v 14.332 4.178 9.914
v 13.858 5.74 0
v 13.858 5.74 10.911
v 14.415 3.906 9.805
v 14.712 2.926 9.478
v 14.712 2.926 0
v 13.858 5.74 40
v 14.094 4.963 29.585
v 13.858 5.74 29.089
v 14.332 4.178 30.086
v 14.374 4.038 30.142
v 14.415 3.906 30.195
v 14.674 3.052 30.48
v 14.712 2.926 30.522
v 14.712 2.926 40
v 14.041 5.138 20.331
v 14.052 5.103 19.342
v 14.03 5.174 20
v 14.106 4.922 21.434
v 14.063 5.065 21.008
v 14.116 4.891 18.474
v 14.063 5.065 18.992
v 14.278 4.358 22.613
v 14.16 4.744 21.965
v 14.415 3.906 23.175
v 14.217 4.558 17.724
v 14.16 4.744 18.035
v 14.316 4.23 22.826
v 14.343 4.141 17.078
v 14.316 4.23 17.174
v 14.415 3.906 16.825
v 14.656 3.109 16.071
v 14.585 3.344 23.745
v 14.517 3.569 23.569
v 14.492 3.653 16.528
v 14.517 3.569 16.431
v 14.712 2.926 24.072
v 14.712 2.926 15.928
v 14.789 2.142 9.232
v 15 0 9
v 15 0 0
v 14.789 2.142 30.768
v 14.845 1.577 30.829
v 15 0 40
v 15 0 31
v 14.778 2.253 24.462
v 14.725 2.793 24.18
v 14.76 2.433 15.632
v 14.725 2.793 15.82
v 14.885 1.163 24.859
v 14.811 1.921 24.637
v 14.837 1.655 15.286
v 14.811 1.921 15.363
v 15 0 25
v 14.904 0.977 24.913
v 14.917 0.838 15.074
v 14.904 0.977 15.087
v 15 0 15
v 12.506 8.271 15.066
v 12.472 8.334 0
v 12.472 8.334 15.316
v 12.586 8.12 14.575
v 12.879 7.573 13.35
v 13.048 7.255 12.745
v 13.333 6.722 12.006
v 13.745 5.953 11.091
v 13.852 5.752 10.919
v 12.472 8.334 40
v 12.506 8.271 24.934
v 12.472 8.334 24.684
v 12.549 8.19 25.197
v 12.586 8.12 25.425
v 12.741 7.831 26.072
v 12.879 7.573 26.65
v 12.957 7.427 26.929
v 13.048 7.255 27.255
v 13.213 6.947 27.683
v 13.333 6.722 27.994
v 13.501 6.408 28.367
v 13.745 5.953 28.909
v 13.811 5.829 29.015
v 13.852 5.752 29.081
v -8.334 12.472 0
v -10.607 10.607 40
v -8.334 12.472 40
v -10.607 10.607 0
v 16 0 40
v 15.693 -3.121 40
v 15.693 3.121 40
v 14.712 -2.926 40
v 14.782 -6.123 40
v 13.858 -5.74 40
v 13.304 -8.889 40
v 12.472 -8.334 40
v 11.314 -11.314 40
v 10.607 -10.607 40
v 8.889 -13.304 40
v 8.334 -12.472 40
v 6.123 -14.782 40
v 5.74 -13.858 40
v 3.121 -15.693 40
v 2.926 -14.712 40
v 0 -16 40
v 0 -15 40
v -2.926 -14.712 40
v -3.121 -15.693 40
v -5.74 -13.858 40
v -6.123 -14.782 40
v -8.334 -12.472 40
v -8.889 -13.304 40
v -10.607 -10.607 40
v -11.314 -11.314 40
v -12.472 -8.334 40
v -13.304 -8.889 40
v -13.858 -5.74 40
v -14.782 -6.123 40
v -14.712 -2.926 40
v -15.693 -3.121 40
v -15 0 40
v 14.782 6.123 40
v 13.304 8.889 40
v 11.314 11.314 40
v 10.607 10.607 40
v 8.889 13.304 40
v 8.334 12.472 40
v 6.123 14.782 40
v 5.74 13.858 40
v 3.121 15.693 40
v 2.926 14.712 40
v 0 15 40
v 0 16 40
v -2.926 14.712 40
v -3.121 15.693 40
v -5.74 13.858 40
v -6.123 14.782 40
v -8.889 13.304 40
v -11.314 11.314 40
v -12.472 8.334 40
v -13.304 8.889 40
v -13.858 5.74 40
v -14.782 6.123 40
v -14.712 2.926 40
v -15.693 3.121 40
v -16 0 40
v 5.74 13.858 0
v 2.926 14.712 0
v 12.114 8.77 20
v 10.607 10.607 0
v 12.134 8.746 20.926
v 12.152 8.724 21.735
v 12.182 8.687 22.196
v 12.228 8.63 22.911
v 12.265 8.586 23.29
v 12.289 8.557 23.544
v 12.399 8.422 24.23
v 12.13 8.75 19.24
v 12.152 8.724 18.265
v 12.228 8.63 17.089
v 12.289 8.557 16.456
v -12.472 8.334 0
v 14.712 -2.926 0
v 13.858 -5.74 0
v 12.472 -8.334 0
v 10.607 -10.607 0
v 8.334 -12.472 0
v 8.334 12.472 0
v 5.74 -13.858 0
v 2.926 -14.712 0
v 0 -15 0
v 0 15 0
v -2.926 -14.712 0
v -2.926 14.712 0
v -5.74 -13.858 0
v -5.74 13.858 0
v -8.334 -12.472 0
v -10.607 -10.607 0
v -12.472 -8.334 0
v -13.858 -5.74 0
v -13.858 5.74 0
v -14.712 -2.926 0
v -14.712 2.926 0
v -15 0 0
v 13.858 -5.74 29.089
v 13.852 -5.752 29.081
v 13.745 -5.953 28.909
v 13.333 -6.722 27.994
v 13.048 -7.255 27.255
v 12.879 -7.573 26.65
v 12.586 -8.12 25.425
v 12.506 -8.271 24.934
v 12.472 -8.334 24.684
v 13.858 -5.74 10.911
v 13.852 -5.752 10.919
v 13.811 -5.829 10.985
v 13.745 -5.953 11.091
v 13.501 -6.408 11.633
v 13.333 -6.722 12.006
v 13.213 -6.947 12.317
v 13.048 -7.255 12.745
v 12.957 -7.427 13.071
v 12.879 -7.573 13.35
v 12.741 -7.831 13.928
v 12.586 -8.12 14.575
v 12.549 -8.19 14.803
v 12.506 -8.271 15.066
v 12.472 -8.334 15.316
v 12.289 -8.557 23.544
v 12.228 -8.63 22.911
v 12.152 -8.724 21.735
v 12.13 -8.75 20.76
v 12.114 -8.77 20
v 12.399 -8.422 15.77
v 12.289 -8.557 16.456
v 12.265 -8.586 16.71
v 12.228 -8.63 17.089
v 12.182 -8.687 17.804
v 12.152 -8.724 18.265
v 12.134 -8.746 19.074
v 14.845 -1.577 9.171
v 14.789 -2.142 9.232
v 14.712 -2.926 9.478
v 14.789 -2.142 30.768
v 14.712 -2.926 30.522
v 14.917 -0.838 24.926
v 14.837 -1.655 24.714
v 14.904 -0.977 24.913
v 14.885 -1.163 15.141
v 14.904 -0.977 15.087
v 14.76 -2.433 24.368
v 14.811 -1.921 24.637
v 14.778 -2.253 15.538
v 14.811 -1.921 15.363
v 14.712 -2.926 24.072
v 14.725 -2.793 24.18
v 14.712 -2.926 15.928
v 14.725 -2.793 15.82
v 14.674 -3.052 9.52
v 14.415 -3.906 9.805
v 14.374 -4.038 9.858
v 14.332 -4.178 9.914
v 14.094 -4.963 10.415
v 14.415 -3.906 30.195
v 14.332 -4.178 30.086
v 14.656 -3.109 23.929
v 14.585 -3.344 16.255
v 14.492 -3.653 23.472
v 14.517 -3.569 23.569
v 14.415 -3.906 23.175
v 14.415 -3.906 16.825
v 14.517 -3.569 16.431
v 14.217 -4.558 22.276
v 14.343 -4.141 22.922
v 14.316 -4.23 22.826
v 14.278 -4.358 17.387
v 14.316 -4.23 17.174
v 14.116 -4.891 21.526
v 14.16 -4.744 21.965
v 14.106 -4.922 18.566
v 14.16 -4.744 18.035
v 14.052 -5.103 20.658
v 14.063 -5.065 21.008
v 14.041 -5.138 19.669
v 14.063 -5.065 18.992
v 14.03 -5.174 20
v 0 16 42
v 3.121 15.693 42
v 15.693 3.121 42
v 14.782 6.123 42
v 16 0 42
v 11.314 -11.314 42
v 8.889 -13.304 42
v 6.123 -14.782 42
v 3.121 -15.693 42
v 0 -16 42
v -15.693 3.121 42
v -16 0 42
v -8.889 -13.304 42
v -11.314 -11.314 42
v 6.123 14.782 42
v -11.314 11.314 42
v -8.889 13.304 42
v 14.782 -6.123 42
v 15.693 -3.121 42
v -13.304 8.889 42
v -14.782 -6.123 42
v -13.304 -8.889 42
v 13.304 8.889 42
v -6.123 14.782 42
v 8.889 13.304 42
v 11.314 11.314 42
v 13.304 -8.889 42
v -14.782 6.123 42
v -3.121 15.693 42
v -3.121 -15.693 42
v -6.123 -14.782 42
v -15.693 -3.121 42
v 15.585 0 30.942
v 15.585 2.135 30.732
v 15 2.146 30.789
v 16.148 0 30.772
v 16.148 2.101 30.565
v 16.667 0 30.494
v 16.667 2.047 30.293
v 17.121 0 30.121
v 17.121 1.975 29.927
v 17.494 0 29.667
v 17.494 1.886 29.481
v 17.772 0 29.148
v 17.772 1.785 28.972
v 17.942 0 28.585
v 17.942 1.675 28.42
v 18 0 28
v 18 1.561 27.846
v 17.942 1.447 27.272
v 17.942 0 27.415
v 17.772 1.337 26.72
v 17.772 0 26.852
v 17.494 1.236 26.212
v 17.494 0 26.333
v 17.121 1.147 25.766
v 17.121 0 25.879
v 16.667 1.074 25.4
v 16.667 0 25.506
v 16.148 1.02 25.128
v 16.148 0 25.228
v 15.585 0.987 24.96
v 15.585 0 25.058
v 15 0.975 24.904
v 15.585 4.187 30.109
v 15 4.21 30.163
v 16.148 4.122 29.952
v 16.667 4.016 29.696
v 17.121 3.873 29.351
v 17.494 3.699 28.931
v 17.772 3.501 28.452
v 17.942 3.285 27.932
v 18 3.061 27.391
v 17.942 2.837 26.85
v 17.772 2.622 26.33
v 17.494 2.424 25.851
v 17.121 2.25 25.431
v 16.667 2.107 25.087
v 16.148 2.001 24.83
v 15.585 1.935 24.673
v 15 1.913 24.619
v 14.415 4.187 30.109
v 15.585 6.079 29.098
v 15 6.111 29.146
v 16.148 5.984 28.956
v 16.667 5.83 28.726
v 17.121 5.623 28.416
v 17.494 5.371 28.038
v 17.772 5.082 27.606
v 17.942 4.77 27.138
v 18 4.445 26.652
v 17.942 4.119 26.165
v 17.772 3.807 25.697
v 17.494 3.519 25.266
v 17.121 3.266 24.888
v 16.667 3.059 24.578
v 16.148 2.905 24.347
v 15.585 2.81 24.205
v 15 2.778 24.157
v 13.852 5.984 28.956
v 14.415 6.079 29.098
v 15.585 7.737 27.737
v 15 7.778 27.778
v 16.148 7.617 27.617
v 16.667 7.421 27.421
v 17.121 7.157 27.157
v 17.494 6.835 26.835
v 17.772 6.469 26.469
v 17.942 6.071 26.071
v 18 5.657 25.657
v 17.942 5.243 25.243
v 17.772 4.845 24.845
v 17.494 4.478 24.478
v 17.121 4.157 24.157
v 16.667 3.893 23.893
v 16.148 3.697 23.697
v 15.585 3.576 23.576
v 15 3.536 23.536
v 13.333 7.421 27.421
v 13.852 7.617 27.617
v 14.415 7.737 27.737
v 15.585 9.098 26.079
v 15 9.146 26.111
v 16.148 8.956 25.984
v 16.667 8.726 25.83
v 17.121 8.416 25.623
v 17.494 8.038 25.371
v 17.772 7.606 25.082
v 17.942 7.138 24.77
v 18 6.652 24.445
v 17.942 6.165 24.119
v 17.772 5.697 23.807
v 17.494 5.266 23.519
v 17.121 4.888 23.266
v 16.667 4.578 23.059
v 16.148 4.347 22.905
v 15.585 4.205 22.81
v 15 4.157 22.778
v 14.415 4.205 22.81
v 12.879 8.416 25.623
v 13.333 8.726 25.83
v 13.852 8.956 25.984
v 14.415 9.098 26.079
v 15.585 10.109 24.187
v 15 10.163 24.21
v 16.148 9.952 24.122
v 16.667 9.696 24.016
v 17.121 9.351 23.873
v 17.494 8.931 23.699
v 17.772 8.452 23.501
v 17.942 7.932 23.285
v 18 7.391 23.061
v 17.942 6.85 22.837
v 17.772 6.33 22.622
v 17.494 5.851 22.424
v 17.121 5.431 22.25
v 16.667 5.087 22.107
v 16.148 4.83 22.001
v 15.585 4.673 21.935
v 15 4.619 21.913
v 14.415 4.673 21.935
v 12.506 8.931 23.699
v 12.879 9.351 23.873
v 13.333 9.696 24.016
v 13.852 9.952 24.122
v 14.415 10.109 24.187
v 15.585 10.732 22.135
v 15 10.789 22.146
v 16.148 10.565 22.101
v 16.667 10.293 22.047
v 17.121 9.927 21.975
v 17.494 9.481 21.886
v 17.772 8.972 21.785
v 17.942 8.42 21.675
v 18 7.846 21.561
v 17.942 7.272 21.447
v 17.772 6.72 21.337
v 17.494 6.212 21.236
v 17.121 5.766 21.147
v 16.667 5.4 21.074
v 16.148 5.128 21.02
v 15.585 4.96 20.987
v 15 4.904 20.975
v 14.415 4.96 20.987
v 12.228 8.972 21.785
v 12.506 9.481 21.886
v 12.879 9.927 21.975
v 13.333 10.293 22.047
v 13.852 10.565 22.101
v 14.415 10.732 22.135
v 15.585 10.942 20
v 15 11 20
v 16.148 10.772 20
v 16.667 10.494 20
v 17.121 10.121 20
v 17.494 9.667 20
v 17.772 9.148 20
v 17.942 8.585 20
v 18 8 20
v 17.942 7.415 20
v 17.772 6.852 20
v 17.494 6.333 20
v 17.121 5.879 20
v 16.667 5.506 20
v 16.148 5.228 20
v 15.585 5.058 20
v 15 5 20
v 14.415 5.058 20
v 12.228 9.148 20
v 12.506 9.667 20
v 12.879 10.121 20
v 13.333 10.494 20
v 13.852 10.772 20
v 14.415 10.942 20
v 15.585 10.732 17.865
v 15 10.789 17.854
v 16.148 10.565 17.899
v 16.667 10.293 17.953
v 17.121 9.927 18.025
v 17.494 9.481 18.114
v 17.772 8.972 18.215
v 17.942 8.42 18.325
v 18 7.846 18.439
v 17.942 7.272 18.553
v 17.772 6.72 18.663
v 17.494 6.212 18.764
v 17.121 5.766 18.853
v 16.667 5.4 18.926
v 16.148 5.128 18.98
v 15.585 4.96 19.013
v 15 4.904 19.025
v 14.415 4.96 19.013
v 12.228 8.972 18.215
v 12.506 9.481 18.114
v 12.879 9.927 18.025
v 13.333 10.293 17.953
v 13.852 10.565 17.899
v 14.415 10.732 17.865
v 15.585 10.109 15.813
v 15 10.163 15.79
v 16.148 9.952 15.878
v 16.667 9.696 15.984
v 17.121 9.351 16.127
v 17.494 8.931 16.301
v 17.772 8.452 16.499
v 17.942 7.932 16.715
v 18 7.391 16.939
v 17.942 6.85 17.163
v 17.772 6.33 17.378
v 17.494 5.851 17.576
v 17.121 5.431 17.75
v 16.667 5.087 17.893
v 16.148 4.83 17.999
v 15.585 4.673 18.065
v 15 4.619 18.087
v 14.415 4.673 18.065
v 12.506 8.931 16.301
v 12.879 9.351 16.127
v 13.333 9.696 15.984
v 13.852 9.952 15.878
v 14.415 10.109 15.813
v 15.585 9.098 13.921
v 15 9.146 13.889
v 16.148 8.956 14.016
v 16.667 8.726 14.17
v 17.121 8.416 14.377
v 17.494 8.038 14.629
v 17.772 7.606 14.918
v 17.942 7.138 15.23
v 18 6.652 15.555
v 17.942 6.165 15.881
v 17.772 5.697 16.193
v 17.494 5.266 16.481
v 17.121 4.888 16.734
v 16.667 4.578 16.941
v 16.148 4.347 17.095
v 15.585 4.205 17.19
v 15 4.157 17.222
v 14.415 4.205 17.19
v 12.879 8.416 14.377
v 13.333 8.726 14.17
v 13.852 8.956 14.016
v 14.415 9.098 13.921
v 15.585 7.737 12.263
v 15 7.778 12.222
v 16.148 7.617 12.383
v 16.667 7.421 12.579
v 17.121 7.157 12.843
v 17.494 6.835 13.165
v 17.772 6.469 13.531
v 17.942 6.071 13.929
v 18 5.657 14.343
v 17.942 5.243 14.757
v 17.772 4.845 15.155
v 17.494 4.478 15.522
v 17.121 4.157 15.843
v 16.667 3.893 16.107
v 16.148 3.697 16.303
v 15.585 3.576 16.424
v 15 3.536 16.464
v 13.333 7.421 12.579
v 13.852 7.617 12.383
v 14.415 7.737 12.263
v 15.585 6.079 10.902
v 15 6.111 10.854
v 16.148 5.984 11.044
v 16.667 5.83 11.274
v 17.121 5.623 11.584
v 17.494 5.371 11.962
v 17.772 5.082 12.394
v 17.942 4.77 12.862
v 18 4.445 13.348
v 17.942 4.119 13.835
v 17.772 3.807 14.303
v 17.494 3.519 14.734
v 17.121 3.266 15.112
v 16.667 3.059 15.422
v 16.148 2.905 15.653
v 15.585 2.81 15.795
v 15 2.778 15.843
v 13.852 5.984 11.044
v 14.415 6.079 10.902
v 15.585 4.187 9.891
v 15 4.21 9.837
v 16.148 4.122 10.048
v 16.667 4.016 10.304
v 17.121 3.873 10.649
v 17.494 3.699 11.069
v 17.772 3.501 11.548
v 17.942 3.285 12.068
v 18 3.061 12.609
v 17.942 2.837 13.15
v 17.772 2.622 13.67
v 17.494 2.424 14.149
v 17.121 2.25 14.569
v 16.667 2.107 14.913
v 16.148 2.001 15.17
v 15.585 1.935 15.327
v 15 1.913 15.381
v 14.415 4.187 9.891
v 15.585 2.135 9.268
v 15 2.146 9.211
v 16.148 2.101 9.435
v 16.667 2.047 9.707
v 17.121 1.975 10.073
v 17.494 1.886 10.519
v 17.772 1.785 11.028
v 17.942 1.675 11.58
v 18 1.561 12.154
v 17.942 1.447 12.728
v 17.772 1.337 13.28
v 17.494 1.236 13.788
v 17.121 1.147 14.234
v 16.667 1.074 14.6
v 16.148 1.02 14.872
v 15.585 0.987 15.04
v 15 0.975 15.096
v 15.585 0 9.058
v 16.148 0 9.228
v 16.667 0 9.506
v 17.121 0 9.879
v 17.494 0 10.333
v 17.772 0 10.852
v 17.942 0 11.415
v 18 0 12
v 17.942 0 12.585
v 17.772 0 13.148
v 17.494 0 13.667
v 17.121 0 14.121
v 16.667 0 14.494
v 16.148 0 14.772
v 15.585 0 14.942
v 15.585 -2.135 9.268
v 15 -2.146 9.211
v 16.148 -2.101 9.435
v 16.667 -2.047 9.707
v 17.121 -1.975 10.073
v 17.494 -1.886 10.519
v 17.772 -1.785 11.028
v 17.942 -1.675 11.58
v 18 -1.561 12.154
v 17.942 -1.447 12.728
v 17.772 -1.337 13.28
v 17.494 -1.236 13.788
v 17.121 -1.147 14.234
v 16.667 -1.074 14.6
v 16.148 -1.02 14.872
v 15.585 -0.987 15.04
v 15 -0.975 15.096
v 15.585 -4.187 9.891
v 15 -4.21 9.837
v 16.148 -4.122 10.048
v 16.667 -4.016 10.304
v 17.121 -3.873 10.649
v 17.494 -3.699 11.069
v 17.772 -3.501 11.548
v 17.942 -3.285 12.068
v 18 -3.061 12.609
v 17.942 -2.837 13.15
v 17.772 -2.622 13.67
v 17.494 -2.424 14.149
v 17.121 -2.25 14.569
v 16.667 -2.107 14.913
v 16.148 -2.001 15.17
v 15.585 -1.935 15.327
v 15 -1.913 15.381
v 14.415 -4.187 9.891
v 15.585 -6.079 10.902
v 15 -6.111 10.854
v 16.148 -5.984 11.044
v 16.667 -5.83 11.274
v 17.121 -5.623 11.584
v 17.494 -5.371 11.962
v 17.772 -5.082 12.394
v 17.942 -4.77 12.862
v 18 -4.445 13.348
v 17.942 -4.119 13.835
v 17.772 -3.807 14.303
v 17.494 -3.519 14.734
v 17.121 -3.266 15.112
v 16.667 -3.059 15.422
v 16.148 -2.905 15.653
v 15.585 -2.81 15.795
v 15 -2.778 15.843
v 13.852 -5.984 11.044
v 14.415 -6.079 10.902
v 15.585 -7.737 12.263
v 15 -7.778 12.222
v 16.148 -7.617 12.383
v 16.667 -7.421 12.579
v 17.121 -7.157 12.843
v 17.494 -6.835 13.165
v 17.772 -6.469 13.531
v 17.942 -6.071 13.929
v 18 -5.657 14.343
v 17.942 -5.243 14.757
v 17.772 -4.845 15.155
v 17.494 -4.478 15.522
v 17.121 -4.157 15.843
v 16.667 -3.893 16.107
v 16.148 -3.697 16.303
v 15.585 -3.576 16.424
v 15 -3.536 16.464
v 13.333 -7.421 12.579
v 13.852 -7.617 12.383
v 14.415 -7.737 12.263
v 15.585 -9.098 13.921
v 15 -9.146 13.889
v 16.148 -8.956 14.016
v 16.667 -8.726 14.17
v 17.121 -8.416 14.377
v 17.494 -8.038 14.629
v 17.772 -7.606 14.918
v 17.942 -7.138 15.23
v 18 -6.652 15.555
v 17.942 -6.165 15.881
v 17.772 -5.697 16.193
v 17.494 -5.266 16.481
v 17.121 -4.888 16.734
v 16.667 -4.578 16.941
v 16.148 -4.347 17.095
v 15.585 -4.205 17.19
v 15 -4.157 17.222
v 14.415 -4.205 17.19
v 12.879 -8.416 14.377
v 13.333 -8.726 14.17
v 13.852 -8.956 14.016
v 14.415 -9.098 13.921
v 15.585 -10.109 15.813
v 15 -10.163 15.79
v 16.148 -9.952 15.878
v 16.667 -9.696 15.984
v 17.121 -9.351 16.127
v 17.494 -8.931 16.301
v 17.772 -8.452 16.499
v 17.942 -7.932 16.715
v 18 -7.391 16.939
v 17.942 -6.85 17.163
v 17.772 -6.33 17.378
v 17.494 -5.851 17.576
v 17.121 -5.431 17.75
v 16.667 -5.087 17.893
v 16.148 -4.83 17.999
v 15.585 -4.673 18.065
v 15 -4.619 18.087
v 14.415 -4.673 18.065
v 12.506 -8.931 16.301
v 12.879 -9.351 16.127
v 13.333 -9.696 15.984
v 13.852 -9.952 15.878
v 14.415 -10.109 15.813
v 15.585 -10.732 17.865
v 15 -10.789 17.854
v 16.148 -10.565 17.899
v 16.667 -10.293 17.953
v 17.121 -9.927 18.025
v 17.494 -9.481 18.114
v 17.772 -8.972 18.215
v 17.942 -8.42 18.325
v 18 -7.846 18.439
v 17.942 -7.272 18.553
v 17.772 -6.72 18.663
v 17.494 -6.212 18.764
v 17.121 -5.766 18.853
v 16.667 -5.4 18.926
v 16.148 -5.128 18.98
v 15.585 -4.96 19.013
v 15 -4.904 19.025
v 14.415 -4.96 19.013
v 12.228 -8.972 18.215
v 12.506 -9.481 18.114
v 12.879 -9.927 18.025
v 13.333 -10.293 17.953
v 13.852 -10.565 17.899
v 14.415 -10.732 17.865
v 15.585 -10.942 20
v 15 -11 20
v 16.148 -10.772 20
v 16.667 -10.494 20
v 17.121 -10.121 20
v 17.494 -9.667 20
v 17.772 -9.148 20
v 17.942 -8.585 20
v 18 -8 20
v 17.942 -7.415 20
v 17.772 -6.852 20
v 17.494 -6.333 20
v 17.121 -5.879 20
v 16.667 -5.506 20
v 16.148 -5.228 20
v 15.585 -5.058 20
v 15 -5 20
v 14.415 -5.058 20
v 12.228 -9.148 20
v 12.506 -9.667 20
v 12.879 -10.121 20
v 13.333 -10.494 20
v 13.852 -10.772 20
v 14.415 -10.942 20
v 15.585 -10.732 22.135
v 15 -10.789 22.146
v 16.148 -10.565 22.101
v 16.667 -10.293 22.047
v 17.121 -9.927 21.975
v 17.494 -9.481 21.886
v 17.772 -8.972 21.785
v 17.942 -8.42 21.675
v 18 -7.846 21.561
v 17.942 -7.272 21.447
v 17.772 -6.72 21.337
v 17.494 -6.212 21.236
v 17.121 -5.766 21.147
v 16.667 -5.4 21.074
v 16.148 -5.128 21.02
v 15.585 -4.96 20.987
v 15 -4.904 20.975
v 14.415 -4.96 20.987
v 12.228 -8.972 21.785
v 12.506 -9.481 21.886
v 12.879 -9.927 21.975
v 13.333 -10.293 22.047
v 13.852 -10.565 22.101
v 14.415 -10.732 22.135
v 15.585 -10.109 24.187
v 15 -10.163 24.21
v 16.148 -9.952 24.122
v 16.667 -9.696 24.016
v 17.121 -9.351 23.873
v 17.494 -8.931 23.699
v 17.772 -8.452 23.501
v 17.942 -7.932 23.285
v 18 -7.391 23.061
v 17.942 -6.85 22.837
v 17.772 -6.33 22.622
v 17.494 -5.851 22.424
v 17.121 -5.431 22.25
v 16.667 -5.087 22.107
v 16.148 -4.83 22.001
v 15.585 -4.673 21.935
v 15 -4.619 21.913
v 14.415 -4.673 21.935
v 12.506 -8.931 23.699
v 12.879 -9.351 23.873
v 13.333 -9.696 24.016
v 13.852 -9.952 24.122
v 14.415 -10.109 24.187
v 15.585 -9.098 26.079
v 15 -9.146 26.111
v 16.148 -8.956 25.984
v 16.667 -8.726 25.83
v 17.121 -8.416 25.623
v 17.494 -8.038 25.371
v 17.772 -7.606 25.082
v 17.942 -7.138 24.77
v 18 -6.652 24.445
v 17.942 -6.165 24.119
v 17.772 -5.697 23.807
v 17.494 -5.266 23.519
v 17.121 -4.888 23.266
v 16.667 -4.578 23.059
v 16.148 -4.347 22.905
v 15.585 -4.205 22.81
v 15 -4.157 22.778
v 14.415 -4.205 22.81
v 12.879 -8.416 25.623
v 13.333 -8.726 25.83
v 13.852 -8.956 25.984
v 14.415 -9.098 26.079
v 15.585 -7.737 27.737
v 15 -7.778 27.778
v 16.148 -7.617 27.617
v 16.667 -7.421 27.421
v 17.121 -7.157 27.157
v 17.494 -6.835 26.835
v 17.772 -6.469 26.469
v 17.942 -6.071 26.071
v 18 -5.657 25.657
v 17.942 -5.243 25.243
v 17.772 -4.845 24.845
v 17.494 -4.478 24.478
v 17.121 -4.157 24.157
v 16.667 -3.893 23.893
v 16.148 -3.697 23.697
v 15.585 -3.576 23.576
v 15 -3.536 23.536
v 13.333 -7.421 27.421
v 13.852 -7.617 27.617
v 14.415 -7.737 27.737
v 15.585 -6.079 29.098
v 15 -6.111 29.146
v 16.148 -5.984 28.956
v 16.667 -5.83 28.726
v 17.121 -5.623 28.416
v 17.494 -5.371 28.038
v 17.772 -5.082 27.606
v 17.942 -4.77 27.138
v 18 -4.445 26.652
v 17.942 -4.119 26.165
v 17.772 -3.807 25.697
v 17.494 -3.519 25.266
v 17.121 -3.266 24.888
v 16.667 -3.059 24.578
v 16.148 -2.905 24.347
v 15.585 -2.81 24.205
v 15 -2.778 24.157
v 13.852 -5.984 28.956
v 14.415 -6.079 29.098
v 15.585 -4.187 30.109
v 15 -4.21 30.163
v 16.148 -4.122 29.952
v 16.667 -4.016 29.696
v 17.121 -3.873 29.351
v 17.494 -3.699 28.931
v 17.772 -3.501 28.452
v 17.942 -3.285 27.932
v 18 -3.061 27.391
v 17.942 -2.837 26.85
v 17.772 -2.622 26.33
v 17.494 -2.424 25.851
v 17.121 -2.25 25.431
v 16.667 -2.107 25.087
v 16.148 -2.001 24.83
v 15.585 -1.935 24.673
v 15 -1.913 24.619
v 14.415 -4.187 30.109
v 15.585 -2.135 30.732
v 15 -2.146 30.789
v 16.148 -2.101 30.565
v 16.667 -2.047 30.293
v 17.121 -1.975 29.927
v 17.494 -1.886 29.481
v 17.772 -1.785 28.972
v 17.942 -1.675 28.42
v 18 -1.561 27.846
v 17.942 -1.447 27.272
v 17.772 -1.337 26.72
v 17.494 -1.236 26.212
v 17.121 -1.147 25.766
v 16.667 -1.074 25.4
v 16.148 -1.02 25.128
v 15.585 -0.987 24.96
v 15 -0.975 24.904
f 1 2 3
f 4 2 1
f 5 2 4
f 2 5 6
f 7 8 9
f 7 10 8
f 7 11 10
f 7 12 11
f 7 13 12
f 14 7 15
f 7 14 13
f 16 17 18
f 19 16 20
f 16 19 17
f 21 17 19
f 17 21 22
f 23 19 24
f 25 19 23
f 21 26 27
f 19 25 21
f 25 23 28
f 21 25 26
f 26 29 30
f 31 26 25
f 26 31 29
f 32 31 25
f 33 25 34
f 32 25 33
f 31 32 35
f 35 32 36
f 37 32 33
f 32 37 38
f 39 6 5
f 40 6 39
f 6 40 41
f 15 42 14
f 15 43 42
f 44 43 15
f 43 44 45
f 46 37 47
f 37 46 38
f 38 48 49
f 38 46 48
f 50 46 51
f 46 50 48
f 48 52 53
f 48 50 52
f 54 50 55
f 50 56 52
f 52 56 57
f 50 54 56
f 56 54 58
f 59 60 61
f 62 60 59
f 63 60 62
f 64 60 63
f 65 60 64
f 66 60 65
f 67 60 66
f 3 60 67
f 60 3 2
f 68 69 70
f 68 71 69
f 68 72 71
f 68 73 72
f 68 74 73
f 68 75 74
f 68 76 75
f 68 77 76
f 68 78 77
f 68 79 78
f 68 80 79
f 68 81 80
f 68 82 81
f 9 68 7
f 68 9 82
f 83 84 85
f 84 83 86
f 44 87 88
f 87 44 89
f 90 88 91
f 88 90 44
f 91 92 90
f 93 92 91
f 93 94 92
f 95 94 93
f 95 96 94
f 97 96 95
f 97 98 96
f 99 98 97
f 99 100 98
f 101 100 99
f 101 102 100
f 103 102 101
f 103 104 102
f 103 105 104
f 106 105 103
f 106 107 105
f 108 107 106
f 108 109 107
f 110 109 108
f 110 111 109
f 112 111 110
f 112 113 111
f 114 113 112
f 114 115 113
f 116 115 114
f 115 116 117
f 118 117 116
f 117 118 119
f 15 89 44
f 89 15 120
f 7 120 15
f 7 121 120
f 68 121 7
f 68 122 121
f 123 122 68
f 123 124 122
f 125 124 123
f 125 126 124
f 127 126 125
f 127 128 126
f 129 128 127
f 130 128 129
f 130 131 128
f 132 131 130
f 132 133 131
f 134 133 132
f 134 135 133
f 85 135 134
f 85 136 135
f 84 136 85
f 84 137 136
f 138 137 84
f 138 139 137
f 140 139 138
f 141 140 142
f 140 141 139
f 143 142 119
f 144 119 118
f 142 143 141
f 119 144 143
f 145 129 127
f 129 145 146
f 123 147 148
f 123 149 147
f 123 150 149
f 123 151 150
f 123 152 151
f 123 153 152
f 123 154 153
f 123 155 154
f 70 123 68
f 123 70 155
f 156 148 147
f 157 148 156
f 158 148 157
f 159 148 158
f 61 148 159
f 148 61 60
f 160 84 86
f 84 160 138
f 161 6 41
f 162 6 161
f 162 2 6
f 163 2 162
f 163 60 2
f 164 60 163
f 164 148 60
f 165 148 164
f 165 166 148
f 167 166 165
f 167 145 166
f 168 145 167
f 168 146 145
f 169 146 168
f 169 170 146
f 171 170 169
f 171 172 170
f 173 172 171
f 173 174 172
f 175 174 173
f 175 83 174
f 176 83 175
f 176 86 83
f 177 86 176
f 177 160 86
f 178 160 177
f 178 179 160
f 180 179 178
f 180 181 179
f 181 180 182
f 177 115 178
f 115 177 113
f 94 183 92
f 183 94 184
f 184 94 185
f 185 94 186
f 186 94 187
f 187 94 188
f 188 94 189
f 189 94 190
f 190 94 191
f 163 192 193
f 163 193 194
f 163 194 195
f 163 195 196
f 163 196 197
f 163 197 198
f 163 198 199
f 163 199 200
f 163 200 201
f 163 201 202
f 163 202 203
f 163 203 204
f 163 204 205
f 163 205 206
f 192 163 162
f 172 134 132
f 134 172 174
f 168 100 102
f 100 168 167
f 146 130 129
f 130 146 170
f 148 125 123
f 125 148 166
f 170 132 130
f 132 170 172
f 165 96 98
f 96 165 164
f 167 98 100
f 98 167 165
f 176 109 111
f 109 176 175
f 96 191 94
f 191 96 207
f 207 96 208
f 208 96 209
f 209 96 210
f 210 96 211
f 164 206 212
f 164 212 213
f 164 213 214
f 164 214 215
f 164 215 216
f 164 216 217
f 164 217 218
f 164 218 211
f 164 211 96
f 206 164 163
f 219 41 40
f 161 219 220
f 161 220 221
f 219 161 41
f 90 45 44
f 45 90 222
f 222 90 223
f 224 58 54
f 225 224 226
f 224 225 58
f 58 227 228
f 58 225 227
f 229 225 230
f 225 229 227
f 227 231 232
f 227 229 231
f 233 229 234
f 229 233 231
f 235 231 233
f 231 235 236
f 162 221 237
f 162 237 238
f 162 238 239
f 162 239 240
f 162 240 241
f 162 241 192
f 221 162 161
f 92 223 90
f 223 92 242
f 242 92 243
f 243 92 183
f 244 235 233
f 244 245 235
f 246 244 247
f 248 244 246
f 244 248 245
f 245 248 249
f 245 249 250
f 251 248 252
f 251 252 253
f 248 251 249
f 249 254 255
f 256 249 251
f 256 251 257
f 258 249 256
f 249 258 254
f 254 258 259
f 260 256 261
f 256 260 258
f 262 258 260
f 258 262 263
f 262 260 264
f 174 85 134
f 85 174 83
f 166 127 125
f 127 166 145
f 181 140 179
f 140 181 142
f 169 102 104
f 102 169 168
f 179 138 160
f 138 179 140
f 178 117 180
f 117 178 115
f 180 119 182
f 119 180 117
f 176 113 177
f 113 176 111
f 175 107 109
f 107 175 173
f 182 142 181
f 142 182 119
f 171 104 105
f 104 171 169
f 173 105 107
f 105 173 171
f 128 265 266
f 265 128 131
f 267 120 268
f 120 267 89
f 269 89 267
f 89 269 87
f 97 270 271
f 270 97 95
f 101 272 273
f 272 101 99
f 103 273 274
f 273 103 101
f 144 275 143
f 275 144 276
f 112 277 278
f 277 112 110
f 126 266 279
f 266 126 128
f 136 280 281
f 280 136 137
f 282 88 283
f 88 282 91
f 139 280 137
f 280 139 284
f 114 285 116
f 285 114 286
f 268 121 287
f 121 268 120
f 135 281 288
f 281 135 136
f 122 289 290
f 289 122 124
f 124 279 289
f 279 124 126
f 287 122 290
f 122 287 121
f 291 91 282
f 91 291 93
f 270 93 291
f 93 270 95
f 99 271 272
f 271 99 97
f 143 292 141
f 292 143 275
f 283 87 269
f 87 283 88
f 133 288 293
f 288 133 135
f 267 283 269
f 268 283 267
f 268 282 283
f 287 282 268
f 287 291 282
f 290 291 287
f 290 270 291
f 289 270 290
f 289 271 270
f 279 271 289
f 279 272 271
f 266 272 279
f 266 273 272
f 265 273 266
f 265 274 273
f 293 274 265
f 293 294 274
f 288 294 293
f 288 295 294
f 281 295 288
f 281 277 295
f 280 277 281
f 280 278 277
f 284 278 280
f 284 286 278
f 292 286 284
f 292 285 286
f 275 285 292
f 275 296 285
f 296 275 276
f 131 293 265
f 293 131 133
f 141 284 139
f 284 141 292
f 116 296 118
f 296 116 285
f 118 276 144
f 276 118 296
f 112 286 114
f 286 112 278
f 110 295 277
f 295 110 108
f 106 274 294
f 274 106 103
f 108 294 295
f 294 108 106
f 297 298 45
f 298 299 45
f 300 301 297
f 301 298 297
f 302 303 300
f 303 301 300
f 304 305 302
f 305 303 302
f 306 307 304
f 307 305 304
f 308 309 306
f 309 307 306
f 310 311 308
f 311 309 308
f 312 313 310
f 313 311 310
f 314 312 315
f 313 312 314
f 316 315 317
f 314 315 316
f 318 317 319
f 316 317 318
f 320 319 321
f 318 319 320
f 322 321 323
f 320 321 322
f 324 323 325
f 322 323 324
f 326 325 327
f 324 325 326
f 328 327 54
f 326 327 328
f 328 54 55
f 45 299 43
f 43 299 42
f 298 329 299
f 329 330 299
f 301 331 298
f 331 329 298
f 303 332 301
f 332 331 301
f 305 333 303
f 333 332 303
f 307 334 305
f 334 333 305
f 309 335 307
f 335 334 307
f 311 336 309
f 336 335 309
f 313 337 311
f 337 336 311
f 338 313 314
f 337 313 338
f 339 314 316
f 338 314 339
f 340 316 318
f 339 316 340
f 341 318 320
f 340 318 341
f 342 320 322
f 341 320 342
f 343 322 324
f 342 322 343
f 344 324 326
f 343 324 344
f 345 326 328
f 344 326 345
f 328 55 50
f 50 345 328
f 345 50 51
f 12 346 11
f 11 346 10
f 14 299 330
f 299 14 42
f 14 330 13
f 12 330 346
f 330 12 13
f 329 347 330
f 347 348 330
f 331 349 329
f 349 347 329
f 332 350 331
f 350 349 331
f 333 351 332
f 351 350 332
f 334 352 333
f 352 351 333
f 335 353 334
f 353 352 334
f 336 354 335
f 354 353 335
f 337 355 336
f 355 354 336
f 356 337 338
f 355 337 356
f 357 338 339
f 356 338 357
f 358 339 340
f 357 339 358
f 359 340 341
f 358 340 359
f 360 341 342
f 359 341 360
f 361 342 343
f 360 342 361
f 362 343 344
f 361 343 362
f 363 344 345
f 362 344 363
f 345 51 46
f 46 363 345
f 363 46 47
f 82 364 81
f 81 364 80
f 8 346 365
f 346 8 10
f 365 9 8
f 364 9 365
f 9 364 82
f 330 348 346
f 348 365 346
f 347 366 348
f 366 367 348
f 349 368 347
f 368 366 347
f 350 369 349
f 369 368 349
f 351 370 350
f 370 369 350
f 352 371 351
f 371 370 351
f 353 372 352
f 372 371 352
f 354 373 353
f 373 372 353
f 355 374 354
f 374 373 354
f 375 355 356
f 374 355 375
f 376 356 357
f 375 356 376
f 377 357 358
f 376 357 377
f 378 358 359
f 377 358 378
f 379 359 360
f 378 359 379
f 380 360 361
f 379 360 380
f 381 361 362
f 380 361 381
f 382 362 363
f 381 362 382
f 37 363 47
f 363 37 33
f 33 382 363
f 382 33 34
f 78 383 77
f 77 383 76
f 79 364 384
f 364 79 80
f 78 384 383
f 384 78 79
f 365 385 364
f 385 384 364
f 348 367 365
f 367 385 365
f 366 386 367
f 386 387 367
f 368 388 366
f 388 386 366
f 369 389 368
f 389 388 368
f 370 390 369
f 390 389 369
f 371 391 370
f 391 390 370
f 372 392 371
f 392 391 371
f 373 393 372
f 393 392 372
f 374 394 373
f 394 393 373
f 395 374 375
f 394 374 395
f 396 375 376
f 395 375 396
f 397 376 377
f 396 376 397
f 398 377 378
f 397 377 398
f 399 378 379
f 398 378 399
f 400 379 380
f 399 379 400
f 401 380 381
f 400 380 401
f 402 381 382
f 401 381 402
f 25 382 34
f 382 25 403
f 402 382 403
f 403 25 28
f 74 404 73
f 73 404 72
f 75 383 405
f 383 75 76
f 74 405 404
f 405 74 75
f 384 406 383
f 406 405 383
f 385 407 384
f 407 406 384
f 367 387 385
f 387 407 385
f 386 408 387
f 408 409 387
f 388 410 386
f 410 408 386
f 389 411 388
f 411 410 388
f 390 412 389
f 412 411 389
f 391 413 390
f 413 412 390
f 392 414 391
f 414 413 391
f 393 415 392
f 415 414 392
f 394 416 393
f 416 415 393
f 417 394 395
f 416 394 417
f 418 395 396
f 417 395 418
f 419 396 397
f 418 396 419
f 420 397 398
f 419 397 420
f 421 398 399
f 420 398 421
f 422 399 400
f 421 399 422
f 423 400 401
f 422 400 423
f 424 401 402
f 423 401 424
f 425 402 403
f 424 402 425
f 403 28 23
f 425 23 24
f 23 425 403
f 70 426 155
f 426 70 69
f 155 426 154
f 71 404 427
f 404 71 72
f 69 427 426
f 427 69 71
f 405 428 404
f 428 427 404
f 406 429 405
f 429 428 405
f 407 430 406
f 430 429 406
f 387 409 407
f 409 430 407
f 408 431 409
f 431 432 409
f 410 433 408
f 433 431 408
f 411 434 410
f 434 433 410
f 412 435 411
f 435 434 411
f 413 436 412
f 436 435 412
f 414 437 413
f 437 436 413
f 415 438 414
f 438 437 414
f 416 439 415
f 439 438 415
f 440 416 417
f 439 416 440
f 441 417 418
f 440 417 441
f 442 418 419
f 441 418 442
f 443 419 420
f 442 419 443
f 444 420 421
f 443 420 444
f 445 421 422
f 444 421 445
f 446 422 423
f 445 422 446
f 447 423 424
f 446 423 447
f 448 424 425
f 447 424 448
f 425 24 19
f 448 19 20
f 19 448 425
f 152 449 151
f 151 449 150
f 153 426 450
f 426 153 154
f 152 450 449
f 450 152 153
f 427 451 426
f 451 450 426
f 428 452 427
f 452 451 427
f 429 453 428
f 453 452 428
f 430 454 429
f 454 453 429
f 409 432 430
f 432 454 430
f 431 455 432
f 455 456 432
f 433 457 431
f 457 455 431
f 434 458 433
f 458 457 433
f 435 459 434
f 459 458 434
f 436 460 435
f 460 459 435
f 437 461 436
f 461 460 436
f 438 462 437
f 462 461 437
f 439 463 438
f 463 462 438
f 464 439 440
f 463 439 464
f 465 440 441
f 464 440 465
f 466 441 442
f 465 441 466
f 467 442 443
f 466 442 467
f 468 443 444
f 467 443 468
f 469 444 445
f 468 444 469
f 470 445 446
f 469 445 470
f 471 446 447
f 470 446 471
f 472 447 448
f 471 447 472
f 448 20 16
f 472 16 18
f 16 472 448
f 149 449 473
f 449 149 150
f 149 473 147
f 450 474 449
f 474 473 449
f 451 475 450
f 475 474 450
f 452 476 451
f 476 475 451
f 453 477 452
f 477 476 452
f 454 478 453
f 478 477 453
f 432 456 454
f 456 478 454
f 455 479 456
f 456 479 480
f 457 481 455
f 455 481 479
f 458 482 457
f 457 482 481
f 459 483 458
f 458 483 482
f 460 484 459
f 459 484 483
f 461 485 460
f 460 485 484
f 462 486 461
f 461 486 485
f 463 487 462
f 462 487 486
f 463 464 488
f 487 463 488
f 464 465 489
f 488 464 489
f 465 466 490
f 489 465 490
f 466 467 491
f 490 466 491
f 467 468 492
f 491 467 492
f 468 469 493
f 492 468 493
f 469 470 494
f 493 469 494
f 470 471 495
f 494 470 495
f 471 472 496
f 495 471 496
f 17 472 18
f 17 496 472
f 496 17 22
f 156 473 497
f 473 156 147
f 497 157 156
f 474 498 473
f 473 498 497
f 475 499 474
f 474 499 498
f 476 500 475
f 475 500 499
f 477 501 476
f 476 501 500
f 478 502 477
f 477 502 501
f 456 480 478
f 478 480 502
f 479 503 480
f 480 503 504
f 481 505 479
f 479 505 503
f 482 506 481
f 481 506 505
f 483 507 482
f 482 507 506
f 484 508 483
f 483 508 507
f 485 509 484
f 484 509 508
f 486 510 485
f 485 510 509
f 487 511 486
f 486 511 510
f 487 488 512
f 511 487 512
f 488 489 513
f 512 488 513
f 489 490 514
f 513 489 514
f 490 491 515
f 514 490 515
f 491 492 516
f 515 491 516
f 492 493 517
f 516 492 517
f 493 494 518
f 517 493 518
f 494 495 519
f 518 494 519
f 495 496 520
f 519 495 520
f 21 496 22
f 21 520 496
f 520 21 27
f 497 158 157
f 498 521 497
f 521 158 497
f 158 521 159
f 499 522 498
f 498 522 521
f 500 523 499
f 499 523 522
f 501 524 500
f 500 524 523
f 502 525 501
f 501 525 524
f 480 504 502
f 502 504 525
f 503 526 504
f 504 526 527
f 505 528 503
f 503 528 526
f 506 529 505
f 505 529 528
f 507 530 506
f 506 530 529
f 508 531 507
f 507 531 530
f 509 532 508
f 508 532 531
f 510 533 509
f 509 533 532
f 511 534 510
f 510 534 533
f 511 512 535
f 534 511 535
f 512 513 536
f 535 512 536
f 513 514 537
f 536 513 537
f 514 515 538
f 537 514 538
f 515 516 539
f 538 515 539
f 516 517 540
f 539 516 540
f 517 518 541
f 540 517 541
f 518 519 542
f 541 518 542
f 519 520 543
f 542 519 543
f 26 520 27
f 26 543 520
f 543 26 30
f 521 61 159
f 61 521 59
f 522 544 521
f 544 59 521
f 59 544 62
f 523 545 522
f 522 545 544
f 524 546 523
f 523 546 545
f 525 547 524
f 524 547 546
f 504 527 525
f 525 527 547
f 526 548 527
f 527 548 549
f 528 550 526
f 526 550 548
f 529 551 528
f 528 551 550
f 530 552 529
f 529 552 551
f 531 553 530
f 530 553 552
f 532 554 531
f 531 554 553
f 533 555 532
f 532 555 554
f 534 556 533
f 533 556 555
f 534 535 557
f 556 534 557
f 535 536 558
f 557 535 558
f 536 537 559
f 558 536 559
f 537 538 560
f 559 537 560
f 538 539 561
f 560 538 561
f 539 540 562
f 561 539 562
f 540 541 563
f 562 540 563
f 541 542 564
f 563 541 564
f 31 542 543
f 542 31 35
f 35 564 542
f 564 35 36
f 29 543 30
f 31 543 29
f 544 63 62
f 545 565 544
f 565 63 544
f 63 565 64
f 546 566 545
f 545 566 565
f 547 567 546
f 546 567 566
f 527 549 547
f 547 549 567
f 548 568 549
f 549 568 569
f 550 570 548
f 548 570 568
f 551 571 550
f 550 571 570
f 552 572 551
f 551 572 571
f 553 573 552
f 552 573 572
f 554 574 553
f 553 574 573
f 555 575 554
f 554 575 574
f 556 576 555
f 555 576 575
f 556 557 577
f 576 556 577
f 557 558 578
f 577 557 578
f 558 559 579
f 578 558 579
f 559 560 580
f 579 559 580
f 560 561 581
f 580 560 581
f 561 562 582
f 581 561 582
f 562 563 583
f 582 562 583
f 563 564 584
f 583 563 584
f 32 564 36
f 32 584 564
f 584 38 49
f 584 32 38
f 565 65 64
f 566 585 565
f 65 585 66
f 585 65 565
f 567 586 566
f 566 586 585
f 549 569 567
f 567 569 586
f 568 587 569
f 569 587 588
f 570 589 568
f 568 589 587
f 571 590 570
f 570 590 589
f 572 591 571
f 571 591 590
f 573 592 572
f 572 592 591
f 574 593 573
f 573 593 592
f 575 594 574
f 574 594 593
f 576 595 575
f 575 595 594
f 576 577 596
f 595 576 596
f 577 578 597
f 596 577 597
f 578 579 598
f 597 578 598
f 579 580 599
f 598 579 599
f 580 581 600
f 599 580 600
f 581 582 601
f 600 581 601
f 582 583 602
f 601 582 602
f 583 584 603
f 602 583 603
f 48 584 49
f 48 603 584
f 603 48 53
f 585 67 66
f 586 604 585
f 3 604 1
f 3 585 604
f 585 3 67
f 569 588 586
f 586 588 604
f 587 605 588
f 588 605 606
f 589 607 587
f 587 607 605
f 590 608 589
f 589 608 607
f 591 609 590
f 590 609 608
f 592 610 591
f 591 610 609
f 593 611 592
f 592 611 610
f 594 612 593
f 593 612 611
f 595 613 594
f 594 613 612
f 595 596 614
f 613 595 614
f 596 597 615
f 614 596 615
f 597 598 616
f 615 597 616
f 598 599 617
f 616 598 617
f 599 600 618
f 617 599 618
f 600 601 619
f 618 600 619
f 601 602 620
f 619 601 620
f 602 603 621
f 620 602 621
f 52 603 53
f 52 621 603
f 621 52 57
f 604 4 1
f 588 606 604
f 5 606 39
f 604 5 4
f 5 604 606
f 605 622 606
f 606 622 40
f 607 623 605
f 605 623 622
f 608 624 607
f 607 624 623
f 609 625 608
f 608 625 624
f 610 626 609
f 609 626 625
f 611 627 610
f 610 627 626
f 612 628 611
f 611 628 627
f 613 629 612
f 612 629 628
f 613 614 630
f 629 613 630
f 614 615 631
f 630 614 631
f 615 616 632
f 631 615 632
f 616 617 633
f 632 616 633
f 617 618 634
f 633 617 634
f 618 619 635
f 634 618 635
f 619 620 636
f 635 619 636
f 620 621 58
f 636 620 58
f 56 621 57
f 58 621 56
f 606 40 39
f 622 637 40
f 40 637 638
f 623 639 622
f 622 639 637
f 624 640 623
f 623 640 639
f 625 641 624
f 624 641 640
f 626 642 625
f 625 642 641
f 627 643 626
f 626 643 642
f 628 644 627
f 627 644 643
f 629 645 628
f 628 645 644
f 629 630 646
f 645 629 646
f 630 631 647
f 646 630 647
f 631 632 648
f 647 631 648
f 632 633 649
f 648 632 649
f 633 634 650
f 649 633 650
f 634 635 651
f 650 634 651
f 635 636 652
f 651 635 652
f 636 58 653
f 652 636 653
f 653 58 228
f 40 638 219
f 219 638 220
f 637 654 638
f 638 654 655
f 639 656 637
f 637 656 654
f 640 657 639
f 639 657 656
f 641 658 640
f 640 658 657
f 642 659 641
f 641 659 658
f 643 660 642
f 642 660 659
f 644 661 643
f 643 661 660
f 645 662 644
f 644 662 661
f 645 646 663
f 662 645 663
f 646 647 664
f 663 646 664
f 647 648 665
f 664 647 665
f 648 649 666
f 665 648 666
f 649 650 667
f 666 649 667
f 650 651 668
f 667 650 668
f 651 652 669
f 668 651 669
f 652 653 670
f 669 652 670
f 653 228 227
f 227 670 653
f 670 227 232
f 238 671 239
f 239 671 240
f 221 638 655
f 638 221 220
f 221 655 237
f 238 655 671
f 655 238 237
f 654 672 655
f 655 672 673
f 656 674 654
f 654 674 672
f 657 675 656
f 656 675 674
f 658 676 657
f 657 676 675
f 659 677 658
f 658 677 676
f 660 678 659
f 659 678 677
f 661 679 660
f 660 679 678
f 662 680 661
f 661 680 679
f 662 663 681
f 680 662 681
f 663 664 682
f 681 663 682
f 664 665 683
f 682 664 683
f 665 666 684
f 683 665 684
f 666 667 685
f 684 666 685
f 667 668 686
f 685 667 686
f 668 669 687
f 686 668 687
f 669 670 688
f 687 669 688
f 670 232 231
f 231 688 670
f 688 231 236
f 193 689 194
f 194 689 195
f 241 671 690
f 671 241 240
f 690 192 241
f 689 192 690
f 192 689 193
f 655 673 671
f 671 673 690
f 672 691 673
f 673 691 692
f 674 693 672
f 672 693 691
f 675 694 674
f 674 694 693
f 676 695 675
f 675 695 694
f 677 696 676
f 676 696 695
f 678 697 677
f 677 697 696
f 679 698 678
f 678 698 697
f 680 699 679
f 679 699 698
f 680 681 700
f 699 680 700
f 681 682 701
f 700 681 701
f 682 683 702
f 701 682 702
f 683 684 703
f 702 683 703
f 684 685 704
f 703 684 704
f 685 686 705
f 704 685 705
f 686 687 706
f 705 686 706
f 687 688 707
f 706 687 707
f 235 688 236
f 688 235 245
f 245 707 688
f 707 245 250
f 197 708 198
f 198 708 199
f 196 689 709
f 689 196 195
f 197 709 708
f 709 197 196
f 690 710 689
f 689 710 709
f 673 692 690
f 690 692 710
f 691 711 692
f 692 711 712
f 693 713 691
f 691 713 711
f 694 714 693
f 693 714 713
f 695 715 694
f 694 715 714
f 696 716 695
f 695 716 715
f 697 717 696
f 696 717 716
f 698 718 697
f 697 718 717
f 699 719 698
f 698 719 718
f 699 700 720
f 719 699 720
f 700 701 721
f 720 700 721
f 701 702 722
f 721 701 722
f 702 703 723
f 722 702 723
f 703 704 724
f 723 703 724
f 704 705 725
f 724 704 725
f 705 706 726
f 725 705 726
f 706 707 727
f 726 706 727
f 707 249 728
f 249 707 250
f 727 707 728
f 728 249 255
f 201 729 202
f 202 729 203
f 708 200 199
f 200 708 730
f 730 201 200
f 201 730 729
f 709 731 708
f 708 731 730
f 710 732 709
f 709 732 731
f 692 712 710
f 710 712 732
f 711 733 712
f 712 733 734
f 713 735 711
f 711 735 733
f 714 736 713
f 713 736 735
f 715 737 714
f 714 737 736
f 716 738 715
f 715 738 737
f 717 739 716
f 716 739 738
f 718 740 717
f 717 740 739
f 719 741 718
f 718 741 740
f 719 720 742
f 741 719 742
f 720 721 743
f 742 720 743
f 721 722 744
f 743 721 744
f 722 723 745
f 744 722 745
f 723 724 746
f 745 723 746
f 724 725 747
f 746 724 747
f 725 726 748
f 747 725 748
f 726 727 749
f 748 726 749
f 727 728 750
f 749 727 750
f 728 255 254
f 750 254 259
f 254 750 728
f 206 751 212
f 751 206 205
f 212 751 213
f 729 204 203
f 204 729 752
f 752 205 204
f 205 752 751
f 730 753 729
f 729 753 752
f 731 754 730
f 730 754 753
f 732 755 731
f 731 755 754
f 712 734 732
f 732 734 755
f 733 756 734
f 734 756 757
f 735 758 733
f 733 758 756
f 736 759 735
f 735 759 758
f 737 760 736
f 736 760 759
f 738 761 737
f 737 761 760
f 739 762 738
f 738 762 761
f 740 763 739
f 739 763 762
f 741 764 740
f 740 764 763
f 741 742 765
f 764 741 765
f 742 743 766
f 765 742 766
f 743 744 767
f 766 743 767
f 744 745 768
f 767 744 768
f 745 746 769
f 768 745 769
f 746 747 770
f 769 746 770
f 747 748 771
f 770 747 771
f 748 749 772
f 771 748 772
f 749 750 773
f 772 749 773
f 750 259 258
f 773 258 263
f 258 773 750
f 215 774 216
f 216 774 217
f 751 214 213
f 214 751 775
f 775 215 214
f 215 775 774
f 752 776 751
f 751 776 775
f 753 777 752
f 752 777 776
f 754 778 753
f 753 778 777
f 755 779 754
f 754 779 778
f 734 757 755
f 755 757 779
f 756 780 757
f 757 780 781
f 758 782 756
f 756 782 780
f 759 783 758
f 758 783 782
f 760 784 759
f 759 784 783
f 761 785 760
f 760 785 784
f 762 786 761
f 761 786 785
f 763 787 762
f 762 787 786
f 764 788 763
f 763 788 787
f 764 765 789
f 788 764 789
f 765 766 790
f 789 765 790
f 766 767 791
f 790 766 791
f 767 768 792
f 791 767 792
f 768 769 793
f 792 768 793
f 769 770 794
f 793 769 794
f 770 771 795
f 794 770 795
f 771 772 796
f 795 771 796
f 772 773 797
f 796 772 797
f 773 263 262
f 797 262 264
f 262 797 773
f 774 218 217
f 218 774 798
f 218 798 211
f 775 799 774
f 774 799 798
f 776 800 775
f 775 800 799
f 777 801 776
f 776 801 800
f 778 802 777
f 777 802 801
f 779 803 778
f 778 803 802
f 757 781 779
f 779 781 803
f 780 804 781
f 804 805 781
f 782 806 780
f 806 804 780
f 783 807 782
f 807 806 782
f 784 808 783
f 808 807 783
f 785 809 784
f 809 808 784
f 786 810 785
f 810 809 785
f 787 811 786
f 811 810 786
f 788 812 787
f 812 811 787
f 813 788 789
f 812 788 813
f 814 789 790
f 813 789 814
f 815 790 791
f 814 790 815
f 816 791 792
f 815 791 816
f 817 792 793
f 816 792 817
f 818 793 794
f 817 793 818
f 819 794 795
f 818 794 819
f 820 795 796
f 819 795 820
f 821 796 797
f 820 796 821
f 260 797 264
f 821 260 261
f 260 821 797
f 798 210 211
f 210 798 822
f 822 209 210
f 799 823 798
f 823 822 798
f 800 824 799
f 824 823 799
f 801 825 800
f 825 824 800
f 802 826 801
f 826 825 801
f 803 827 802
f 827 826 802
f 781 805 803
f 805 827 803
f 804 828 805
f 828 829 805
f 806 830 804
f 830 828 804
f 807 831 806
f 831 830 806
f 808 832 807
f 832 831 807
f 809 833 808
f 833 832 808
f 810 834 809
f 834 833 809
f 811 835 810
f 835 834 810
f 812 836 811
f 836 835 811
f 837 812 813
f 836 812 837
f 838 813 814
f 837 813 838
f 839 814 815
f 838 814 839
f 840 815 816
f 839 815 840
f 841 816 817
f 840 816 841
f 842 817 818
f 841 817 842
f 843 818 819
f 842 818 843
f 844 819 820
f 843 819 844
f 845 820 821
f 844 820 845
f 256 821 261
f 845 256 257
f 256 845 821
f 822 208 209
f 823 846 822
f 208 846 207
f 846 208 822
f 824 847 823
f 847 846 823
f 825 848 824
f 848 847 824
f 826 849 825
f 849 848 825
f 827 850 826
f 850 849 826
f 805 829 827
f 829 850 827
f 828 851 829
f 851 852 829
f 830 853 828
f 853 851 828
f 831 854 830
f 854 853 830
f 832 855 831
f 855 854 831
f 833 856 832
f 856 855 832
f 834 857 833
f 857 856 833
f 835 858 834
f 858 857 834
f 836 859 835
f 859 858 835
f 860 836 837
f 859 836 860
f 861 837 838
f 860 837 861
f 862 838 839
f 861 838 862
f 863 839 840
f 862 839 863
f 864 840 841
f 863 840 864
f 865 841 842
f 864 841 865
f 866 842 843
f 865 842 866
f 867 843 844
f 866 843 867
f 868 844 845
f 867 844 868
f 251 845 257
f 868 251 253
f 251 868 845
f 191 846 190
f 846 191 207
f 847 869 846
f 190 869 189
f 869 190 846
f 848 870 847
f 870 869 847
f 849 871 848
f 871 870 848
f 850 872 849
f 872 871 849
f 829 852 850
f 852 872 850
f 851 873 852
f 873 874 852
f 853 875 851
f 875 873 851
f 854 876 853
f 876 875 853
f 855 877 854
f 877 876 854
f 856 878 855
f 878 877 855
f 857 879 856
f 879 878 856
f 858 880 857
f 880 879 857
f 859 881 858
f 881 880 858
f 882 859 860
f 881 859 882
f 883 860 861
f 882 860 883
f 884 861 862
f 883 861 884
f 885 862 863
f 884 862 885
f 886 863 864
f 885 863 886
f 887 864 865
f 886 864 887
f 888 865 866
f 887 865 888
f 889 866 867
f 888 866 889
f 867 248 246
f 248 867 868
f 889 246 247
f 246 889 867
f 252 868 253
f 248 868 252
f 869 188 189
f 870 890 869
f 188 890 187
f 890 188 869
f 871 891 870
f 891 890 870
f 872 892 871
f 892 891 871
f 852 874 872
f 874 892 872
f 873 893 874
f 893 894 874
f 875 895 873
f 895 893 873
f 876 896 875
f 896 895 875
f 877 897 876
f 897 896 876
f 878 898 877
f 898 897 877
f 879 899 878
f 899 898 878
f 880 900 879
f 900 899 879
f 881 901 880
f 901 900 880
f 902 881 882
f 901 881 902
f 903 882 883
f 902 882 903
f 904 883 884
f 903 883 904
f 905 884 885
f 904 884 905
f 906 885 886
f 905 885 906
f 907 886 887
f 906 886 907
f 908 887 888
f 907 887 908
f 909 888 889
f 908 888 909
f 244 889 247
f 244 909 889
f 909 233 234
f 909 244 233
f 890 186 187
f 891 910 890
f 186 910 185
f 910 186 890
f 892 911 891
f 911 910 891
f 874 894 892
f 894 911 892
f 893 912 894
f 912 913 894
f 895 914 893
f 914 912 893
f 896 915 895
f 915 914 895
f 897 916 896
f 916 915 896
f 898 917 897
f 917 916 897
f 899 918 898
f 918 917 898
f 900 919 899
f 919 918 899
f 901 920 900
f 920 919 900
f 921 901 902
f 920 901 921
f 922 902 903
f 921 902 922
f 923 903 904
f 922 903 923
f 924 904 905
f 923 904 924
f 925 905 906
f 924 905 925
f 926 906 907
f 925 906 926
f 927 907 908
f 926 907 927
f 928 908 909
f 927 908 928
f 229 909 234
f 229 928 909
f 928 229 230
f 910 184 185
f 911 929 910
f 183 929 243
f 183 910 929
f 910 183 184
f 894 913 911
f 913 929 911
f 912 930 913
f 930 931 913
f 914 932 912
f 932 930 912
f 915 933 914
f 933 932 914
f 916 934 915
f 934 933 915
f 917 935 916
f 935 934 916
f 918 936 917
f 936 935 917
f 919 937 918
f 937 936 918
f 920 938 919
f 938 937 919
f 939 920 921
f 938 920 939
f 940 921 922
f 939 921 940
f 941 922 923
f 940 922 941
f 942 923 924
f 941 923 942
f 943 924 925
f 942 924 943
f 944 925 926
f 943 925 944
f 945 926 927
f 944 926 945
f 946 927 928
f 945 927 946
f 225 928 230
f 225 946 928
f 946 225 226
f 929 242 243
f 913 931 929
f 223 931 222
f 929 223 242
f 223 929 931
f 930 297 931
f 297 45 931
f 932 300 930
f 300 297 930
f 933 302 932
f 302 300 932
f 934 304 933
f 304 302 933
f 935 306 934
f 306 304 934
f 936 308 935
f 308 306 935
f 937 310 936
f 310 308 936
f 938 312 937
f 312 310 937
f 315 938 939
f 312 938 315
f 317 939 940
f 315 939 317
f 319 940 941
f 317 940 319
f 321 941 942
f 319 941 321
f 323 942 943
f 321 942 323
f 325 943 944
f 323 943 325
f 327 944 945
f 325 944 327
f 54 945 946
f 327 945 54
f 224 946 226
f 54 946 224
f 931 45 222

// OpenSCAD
$fn = 32;

// Coffee Mug
module mug_body() {
    cylinder(h = 40, r = 15);
}

module mug_rim() {
    translate([0, 0, 40])
    cylinder(h = 2, r = 16);
}

module mug_handle() {
    translate([15, 0, 20])
    rotate([0, 90, 0])
    rotate_extrude(convexity = 10)
    translate([8, 0, 0])
    circle(r = 3);
}

union() {
    mug_body();
    mug_rim();
    mug_handle();
}
